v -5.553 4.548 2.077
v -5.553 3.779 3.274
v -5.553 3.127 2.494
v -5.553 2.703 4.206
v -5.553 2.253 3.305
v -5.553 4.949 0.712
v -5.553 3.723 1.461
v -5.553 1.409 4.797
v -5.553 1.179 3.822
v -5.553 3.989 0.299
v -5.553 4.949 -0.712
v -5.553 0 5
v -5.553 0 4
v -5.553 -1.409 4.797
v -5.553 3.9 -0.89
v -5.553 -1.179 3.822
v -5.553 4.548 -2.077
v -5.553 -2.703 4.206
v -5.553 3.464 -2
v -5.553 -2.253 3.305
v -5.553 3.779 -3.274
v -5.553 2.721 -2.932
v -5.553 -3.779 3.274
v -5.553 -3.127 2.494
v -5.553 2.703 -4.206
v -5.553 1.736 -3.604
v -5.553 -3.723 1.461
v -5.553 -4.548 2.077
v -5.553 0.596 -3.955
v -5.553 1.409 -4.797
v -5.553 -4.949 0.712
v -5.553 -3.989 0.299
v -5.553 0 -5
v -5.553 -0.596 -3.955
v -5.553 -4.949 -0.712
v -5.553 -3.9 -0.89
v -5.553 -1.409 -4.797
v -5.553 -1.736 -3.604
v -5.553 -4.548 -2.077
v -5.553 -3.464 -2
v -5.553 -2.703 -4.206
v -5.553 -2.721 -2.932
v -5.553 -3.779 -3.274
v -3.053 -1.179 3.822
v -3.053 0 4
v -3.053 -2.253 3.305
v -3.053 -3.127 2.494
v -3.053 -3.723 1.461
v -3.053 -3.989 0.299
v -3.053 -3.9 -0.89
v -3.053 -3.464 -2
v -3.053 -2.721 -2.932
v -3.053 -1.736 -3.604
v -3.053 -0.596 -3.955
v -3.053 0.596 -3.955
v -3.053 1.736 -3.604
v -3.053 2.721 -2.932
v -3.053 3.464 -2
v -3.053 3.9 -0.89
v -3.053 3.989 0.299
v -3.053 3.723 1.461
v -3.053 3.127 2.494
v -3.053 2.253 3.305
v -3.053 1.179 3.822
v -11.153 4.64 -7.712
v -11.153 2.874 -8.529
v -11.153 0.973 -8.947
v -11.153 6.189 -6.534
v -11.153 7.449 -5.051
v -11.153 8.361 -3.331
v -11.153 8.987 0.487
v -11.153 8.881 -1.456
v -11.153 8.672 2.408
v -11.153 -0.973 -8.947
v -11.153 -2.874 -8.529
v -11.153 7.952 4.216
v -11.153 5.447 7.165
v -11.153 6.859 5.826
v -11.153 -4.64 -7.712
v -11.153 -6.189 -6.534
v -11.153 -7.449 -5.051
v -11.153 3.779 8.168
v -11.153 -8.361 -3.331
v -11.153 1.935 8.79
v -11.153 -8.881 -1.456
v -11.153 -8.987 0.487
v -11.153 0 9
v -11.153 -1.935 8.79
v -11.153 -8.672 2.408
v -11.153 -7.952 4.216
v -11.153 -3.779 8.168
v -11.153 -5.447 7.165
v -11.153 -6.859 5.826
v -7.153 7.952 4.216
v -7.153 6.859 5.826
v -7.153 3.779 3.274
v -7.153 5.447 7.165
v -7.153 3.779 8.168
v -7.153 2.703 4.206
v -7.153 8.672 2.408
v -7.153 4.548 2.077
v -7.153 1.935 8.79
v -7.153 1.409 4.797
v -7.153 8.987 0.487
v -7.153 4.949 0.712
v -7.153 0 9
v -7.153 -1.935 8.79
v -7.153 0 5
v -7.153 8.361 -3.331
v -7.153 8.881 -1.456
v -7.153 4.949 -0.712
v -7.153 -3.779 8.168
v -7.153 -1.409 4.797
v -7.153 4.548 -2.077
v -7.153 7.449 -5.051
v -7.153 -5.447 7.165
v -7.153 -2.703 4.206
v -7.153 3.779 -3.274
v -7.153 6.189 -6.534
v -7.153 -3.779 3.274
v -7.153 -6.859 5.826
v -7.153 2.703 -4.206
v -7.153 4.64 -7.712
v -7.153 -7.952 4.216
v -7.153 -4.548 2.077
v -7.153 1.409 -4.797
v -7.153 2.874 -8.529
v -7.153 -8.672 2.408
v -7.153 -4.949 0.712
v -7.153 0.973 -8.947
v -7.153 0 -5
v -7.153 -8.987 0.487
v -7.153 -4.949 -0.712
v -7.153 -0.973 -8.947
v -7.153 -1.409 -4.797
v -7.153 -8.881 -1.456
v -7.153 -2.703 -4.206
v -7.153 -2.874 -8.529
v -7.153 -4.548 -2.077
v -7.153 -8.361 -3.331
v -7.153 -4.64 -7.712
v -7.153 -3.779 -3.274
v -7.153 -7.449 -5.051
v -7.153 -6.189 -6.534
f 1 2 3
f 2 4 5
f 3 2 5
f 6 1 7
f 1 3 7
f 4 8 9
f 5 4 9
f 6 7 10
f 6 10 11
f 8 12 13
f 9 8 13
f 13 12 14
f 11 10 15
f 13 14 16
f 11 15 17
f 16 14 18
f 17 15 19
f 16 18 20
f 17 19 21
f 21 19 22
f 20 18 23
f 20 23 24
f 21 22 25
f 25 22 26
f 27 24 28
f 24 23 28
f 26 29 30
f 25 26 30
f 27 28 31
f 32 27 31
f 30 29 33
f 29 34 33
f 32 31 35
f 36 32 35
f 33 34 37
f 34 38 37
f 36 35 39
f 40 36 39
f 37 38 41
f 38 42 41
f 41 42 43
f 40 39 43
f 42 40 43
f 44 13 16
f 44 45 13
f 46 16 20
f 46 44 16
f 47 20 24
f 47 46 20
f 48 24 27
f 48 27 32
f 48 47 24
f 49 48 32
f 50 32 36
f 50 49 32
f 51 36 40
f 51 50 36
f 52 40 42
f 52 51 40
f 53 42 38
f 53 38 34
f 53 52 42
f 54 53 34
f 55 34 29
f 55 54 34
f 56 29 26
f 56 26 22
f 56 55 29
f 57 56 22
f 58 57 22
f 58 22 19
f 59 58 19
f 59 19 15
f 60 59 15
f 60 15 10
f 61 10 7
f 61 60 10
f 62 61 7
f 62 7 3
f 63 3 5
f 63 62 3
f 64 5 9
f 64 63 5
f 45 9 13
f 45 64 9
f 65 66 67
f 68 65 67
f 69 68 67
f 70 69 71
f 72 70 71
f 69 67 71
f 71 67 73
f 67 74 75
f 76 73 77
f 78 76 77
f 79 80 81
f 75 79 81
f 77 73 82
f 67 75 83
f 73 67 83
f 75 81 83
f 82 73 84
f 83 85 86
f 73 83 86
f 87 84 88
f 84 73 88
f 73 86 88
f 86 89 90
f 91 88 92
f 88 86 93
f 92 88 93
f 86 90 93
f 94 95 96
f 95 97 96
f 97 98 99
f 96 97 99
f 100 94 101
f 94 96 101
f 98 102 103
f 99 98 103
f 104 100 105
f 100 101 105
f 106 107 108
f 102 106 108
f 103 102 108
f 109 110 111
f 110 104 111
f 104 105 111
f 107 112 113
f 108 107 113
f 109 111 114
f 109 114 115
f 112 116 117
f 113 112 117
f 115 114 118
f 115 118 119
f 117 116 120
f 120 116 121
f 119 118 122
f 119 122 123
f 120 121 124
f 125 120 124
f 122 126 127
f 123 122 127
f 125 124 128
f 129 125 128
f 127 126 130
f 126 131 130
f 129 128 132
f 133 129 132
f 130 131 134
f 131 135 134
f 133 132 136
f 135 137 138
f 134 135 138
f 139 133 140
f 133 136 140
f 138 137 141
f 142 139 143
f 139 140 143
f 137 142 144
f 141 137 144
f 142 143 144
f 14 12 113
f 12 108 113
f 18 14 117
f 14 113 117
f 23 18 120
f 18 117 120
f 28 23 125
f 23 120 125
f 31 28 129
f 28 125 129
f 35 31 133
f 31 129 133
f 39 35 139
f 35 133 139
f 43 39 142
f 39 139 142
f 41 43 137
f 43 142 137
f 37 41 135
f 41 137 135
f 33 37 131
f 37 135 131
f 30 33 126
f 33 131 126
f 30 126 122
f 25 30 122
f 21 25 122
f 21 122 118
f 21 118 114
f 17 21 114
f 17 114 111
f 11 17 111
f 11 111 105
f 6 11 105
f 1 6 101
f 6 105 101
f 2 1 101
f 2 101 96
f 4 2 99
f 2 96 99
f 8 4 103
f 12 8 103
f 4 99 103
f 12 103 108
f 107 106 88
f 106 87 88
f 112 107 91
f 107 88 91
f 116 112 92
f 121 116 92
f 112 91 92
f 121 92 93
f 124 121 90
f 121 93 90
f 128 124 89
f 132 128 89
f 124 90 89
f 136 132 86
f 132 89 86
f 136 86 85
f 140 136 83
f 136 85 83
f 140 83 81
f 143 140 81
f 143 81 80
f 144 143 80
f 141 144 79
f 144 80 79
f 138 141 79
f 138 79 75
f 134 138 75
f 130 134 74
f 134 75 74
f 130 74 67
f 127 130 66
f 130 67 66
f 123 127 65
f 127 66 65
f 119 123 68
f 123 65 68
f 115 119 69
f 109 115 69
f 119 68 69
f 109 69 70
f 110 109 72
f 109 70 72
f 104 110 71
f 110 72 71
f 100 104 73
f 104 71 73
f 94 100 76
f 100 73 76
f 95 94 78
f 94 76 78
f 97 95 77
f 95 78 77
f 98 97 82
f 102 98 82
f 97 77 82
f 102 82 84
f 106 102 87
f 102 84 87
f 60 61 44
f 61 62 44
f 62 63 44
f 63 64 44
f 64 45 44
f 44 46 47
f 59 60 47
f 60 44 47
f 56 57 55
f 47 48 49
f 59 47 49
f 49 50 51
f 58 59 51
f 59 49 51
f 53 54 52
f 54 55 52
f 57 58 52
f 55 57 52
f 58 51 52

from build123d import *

# Parameters (mm, degrees)
F0_W = 2.5
F0_H = 4


with BuildPart() as f1:
    # F0 (on Front) → F1 (revolve)
    with BuildSketch(Plane.XZ):
        Polygon((-7.152688, 5), (-7.152688, 0), (-5.552688, 0), (-5.552688, 4), (-5.552688, 5), align=None)
        Polygon((-11.152688, 0), (-7.152688, 0), (-7.152688, 5), (-7.152688, 9), (-11.152688, 9), (-11.152688, 8.198828), align=None)
        with Locations((-4.302688, 2)):
            Rectangle(F0_W, F0_H)
    revolve(axis=Axis((-2.808182, 0, 0), (1, 0, 0)))


solid = f1.part
